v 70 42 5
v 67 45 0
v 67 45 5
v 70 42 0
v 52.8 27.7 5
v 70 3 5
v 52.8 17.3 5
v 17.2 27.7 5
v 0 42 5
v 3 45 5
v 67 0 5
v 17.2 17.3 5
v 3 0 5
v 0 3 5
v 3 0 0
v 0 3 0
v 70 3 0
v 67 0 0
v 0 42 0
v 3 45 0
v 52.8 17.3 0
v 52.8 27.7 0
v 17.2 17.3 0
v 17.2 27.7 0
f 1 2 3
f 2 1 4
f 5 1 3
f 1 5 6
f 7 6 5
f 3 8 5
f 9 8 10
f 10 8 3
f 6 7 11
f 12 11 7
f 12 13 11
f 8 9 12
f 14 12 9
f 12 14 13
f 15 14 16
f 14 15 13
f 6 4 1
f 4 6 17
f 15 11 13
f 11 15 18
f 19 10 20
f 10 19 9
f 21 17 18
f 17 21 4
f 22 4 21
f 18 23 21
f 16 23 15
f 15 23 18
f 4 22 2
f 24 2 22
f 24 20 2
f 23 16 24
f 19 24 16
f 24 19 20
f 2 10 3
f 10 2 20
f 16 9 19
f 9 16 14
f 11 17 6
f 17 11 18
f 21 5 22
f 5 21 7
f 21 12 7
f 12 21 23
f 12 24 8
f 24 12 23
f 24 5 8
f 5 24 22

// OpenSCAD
$fn = 32;

// ----------------------------------------------------------------------
// Windowed plate: 1 voids, 70 x 45 x 5 mm
// ----------------------------------------------------------------------

// --- parameters (mm) ---
plate_l = 70;             // plate length, X
plate_w = 45;             // plate width, Y
plate_t = 5;              // plate thickness, Z
edge_margin = 12;         // wall from the plate edge to any window
win1_l = 35.6;            // window length
win1_w = 10.4;            // window width
depth_1 = 5;              // depth of void 1 (full thickness = through)
corner_c = 3;             // corner chamfer of the plate

profile = [[3, 0], [67, 0], [70, 3], [70, 42], [67, 45], [3, 45], [0, 42], [0, 3]];  // primary outline, 8 points, counter clockwise
void_1 = [[17.2, 17.3], [52.8, 17.3], [52.8, 27.7], [17.2, 27.7]];  // large central window, 4 points

// --- the one profile operation ---
difference() {
  linear_extrude(height = plate_t) polygon(points = profile);
  translate([0, 0, -1])
    linear_extrude(height = plate_t + 2) polygon(points = void_1);
}
